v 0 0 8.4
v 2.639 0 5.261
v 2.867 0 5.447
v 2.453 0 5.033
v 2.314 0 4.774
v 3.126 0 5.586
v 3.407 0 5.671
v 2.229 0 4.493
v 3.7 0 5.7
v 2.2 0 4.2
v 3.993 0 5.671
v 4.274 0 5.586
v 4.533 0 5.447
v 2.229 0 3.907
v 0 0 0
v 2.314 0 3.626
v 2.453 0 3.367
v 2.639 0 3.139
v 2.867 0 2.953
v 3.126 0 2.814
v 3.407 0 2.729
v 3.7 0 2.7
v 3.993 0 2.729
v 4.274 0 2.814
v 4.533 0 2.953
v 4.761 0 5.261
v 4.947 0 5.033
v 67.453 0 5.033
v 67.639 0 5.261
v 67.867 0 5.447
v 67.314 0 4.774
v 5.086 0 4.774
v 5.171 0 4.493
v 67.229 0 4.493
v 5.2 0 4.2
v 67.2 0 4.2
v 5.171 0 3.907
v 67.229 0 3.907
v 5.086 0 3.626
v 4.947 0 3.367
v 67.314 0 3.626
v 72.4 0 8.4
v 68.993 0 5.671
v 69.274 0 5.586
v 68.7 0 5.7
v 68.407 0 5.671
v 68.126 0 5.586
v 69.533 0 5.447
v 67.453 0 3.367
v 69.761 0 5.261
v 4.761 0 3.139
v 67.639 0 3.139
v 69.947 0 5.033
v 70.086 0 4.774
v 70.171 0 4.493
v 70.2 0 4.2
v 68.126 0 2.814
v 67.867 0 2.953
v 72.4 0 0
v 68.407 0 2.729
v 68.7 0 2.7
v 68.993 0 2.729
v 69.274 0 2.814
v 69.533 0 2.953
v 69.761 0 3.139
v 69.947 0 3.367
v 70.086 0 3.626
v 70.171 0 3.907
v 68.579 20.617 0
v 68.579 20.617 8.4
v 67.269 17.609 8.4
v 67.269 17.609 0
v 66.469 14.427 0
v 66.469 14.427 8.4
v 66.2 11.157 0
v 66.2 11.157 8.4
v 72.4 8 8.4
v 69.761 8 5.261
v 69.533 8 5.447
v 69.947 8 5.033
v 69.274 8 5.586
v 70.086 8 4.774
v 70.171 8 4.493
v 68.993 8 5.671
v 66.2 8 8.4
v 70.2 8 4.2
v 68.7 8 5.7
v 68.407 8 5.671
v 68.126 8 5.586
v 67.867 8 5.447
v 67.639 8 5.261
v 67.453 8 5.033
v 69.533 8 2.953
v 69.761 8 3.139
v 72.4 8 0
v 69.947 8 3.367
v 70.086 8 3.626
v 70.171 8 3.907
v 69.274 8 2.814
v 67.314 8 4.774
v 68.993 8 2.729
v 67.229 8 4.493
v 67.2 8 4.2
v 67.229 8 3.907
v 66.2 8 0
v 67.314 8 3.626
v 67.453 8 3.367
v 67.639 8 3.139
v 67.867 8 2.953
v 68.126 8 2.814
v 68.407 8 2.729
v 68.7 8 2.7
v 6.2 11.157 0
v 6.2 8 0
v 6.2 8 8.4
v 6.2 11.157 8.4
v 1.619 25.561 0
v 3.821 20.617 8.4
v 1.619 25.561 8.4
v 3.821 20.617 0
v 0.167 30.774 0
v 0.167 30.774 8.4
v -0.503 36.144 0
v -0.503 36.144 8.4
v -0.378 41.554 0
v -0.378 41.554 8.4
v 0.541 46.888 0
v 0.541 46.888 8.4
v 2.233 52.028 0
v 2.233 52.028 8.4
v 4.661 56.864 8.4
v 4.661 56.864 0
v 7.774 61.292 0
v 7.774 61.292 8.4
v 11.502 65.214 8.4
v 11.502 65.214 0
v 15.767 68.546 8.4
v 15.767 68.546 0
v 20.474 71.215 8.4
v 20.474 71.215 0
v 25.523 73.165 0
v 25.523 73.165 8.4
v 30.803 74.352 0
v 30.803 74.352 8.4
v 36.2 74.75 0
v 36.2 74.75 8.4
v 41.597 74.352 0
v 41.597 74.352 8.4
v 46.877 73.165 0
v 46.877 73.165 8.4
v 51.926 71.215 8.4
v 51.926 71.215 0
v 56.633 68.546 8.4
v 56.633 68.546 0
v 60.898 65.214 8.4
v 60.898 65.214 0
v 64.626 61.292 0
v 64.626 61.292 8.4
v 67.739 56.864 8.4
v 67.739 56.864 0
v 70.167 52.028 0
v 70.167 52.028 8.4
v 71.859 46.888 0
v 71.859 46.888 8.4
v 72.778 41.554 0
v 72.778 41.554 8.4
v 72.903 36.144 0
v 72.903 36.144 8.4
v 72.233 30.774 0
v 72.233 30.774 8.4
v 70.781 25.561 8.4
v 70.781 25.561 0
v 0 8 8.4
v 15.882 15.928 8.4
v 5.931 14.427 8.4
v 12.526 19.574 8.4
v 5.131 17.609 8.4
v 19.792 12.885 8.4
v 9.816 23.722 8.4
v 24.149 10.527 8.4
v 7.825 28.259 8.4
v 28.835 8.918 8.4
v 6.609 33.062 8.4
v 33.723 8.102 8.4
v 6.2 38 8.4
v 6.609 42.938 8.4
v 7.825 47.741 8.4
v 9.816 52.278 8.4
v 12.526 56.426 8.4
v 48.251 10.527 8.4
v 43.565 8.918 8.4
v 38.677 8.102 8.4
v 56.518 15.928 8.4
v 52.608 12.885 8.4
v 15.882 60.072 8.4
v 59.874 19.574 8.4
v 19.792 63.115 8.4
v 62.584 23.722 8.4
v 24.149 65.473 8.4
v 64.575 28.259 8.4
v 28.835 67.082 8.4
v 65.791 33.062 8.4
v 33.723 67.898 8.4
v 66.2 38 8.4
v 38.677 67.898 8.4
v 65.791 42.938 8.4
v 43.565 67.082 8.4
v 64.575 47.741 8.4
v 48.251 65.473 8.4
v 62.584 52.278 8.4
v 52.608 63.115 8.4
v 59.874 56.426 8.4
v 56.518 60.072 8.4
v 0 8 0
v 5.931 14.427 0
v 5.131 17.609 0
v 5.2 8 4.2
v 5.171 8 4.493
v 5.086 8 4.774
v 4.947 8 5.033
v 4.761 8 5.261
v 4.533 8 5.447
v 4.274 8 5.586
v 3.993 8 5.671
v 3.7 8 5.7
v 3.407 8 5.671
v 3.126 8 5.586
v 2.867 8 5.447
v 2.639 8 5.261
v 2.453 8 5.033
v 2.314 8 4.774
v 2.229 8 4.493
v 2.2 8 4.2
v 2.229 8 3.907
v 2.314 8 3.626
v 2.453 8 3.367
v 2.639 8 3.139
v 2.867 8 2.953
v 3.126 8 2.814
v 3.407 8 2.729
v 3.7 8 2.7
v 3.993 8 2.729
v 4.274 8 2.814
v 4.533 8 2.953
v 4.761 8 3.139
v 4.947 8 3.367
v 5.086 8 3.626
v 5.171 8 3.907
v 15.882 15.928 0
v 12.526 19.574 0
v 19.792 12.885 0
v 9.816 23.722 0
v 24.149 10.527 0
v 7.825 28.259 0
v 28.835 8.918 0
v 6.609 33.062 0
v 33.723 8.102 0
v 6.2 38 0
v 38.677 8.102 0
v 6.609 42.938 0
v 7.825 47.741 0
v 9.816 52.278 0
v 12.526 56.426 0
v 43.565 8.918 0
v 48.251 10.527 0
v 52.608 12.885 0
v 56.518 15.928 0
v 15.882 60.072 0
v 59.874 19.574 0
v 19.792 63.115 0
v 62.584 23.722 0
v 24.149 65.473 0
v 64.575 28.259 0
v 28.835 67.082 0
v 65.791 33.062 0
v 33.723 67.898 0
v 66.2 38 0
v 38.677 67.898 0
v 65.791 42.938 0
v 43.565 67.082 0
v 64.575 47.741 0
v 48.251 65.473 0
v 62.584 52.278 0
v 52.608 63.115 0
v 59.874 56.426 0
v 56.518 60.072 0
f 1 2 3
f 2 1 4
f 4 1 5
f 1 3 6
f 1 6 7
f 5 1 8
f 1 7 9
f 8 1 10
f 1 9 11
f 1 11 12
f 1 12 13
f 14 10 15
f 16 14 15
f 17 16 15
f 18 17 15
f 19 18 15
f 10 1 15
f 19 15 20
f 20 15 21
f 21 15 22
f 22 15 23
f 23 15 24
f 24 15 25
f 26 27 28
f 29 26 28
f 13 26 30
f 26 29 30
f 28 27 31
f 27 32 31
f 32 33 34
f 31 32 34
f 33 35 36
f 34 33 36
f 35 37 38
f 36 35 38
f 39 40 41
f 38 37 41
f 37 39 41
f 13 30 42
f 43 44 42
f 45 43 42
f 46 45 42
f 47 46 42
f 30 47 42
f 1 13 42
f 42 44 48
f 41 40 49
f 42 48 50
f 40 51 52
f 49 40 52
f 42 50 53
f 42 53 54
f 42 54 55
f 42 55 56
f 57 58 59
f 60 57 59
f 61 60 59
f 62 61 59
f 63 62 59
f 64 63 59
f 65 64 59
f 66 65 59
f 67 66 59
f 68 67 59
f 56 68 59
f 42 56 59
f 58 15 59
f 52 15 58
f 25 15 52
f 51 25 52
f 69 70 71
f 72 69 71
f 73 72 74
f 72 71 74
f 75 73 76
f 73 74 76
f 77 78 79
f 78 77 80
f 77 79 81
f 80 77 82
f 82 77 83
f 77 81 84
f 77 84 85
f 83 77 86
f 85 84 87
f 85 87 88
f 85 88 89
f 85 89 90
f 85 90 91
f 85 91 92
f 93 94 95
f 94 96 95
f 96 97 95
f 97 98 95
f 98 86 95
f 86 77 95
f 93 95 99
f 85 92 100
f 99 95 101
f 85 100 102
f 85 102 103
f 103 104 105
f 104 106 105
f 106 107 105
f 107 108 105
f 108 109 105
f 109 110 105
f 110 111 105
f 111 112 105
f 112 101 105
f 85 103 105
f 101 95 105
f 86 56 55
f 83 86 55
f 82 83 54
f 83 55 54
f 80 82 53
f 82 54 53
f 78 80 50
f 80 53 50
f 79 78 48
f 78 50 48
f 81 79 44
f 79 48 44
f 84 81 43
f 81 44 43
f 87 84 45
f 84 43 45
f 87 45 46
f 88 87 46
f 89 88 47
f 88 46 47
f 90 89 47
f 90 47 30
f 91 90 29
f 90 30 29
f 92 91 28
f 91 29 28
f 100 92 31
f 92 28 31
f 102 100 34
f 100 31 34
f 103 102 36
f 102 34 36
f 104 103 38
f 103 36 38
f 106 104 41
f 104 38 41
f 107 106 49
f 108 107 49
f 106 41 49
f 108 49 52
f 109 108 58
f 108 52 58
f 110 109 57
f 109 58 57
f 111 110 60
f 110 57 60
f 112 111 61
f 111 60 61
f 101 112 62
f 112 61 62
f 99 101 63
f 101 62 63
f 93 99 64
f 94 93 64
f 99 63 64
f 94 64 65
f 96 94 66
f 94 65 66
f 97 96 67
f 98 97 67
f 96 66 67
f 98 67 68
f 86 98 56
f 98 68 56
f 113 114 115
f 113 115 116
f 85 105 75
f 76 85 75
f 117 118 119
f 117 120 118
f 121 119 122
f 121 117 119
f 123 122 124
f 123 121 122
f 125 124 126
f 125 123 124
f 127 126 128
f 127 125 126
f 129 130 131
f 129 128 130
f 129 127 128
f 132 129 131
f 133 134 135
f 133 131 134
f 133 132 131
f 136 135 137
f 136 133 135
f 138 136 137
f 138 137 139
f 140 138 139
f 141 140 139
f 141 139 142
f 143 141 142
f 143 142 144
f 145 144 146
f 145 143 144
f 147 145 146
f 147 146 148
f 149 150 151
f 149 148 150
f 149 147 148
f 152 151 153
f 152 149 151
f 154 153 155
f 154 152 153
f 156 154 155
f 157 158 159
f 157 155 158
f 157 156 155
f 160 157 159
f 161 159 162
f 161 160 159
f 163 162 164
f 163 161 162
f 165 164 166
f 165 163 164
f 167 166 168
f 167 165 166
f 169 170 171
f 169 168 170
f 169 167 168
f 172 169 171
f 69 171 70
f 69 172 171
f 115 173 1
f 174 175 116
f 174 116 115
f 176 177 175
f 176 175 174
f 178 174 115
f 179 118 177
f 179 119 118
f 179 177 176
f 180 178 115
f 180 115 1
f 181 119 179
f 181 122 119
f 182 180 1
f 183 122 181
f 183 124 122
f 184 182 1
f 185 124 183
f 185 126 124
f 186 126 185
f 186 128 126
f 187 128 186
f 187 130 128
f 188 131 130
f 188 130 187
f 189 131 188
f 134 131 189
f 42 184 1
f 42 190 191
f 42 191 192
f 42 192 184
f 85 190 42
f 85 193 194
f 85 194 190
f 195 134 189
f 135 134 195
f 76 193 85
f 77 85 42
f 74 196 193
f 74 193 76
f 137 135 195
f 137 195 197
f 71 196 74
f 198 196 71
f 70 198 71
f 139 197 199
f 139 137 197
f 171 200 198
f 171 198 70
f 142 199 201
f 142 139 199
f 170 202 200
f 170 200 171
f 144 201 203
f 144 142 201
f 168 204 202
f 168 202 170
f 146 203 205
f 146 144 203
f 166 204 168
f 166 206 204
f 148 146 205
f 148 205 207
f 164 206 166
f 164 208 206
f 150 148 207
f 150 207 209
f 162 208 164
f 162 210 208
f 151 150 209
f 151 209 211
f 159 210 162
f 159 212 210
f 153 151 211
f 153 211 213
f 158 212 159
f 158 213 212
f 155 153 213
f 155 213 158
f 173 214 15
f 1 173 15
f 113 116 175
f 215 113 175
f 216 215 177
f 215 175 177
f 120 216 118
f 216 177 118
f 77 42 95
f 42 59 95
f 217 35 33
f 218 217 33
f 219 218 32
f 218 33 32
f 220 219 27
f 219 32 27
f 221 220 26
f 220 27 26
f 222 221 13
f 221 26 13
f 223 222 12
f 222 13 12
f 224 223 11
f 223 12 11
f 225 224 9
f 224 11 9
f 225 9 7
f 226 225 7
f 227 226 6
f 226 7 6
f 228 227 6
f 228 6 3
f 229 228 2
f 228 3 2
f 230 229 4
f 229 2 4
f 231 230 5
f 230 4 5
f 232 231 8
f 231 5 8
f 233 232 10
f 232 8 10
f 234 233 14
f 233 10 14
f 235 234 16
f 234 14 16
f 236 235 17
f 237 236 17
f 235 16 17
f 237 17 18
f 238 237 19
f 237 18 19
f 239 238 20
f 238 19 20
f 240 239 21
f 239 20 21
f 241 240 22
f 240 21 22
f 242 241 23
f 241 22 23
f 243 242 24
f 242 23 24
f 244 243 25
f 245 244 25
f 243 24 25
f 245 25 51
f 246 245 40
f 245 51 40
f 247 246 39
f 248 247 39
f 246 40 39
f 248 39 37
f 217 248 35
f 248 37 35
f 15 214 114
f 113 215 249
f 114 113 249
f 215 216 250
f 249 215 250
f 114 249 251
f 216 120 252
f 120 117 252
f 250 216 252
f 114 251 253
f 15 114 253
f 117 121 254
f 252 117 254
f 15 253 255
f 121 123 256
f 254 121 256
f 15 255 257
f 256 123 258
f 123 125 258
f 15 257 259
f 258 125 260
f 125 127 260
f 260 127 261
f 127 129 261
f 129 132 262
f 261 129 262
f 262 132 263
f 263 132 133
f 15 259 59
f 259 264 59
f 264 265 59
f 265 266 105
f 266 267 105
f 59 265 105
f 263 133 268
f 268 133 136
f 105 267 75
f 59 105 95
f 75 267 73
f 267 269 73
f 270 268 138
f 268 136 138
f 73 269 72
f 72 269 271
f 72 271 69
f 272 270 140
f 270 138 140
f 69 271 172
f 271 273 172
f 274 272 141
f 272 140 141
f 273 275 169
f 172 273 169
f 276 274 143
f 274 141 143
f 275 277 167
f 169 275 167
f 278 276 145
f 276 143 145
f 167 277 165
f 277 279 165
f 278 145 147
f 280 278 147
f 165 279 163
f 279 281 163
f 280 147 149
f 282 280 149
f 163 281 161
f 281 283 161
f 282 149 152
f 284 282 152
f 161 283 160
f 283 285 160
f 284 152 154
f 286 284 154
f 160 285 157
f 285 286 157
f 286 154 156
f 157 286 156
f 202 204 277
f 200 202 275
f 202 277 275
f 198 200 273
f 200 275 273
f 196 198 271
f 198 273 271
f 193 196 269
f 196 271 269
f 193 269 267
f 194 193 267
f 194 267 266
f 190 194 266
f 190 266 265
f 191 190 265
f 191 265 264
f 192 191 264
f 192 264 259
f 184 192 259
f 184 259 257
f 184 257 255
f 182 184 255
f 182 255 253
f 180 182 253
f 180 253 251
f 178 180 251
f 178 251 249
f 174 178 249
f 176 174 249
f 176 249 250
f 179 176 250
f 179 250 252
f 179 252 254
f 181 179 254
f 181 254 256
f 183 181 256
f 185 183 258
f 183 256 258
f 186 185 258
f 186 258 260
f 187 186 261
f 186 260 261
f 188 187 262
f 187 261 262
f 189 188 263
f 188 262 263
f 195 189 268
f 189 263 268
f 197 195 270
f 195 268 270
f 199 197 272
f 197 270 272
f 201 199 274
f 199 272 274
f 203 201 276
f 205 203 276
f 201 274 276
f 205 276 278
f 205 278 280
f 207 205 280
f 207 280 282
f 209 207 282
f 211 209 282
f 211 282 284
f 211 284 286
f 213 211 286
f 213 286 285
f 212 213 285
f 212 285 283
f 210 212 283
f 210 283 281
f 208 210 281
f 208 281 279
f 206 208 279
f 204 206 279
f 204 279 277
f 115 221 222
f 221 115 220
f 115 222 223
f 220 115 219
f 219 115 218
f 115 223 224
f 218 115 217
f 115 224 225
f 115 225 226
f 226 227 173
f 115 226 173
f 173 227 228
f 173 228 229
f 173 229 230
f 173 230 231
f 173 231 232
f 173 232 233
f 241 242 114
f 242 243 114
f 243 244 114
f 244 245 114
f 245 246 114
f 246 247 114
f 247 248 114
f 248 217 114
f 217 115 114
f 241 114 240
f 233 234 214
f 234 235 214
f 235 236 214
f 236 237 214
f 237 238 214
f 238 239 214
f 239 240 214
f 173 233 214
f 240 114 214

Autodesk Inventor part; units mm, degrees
ref_plane "YZ Plane" through (0, 0, 0) normal (1, 0, 0) x (0, 1, 0)
ref_plane "XZ Plane" through (0, 0, 0) normal (0, 1, 0) x (-1, 0, 0)
ref_plane "XY Plane" through (0, 0, 0) normal (0, 0, 1) x (1, 0, 0)
sketch "Sketch1" plane through (0, 0, 0) normal (0, 0, 1) x (1, 0, 0)
  line L0 (0, 0) -> (72.4, 0)
  line L1 (72.4, 0) -> (72.4, 8)
  line L2 (72.4, 8) -> (0, 8)
  line L3 (0, 8) -> (0, 0)
  line L4 (36.2, 8) -> (36.2, 38) construction
  circle A0 centre (36.2, 38) radius 30
  circle A1 centre (36.2, 38) radius 36.75
  line L5 (6.2, 8) -> (6.2, 16.7735)
  line L6 (66.2, 8) -> (66.2, 16.7735)
  dimension "d0" = 72.4
  dimension "d1" = 8
  dimension "d2" = 30
  dimension "d3" = 60
  dimension "d4" = 73.5
extrude "Extrusion1" add sketch "Sketch1" along normal blind 8.4
fillet "Fillet1" radius 20 2 edges at (66.2, 16.7735, 4.2) (6.2, 16.7735, 4.2)
sketch "Sketch2" plane through (0, 0, 0) normal (0, -1, 0) x (1, 0, 0)
  line L0 (72.4, 0) -> (72.4, 8.4) projected
  line L1 (0, 0) -> (0, 8.4) construction
  line L2 (0, 4.2) -> (3.7, 4.2) construction
  circle A0 centre (3.7, 4.2) radius 1.5
  line L3 (72.4, 4.2) -> (68.7, 4.2) construction
  circle A1 centre (68.7, 4.2) radius 1.5
  dimension "d8" = 3.7
  dimension "d9" = 3
  dimension "d10" = 3.7
  dimension "d11" = 3
extrude "Extrusion2" cut sketch "Sketch2" against normal up to surface (8 mm away)
properties part number "reservoir pump combo mount"
